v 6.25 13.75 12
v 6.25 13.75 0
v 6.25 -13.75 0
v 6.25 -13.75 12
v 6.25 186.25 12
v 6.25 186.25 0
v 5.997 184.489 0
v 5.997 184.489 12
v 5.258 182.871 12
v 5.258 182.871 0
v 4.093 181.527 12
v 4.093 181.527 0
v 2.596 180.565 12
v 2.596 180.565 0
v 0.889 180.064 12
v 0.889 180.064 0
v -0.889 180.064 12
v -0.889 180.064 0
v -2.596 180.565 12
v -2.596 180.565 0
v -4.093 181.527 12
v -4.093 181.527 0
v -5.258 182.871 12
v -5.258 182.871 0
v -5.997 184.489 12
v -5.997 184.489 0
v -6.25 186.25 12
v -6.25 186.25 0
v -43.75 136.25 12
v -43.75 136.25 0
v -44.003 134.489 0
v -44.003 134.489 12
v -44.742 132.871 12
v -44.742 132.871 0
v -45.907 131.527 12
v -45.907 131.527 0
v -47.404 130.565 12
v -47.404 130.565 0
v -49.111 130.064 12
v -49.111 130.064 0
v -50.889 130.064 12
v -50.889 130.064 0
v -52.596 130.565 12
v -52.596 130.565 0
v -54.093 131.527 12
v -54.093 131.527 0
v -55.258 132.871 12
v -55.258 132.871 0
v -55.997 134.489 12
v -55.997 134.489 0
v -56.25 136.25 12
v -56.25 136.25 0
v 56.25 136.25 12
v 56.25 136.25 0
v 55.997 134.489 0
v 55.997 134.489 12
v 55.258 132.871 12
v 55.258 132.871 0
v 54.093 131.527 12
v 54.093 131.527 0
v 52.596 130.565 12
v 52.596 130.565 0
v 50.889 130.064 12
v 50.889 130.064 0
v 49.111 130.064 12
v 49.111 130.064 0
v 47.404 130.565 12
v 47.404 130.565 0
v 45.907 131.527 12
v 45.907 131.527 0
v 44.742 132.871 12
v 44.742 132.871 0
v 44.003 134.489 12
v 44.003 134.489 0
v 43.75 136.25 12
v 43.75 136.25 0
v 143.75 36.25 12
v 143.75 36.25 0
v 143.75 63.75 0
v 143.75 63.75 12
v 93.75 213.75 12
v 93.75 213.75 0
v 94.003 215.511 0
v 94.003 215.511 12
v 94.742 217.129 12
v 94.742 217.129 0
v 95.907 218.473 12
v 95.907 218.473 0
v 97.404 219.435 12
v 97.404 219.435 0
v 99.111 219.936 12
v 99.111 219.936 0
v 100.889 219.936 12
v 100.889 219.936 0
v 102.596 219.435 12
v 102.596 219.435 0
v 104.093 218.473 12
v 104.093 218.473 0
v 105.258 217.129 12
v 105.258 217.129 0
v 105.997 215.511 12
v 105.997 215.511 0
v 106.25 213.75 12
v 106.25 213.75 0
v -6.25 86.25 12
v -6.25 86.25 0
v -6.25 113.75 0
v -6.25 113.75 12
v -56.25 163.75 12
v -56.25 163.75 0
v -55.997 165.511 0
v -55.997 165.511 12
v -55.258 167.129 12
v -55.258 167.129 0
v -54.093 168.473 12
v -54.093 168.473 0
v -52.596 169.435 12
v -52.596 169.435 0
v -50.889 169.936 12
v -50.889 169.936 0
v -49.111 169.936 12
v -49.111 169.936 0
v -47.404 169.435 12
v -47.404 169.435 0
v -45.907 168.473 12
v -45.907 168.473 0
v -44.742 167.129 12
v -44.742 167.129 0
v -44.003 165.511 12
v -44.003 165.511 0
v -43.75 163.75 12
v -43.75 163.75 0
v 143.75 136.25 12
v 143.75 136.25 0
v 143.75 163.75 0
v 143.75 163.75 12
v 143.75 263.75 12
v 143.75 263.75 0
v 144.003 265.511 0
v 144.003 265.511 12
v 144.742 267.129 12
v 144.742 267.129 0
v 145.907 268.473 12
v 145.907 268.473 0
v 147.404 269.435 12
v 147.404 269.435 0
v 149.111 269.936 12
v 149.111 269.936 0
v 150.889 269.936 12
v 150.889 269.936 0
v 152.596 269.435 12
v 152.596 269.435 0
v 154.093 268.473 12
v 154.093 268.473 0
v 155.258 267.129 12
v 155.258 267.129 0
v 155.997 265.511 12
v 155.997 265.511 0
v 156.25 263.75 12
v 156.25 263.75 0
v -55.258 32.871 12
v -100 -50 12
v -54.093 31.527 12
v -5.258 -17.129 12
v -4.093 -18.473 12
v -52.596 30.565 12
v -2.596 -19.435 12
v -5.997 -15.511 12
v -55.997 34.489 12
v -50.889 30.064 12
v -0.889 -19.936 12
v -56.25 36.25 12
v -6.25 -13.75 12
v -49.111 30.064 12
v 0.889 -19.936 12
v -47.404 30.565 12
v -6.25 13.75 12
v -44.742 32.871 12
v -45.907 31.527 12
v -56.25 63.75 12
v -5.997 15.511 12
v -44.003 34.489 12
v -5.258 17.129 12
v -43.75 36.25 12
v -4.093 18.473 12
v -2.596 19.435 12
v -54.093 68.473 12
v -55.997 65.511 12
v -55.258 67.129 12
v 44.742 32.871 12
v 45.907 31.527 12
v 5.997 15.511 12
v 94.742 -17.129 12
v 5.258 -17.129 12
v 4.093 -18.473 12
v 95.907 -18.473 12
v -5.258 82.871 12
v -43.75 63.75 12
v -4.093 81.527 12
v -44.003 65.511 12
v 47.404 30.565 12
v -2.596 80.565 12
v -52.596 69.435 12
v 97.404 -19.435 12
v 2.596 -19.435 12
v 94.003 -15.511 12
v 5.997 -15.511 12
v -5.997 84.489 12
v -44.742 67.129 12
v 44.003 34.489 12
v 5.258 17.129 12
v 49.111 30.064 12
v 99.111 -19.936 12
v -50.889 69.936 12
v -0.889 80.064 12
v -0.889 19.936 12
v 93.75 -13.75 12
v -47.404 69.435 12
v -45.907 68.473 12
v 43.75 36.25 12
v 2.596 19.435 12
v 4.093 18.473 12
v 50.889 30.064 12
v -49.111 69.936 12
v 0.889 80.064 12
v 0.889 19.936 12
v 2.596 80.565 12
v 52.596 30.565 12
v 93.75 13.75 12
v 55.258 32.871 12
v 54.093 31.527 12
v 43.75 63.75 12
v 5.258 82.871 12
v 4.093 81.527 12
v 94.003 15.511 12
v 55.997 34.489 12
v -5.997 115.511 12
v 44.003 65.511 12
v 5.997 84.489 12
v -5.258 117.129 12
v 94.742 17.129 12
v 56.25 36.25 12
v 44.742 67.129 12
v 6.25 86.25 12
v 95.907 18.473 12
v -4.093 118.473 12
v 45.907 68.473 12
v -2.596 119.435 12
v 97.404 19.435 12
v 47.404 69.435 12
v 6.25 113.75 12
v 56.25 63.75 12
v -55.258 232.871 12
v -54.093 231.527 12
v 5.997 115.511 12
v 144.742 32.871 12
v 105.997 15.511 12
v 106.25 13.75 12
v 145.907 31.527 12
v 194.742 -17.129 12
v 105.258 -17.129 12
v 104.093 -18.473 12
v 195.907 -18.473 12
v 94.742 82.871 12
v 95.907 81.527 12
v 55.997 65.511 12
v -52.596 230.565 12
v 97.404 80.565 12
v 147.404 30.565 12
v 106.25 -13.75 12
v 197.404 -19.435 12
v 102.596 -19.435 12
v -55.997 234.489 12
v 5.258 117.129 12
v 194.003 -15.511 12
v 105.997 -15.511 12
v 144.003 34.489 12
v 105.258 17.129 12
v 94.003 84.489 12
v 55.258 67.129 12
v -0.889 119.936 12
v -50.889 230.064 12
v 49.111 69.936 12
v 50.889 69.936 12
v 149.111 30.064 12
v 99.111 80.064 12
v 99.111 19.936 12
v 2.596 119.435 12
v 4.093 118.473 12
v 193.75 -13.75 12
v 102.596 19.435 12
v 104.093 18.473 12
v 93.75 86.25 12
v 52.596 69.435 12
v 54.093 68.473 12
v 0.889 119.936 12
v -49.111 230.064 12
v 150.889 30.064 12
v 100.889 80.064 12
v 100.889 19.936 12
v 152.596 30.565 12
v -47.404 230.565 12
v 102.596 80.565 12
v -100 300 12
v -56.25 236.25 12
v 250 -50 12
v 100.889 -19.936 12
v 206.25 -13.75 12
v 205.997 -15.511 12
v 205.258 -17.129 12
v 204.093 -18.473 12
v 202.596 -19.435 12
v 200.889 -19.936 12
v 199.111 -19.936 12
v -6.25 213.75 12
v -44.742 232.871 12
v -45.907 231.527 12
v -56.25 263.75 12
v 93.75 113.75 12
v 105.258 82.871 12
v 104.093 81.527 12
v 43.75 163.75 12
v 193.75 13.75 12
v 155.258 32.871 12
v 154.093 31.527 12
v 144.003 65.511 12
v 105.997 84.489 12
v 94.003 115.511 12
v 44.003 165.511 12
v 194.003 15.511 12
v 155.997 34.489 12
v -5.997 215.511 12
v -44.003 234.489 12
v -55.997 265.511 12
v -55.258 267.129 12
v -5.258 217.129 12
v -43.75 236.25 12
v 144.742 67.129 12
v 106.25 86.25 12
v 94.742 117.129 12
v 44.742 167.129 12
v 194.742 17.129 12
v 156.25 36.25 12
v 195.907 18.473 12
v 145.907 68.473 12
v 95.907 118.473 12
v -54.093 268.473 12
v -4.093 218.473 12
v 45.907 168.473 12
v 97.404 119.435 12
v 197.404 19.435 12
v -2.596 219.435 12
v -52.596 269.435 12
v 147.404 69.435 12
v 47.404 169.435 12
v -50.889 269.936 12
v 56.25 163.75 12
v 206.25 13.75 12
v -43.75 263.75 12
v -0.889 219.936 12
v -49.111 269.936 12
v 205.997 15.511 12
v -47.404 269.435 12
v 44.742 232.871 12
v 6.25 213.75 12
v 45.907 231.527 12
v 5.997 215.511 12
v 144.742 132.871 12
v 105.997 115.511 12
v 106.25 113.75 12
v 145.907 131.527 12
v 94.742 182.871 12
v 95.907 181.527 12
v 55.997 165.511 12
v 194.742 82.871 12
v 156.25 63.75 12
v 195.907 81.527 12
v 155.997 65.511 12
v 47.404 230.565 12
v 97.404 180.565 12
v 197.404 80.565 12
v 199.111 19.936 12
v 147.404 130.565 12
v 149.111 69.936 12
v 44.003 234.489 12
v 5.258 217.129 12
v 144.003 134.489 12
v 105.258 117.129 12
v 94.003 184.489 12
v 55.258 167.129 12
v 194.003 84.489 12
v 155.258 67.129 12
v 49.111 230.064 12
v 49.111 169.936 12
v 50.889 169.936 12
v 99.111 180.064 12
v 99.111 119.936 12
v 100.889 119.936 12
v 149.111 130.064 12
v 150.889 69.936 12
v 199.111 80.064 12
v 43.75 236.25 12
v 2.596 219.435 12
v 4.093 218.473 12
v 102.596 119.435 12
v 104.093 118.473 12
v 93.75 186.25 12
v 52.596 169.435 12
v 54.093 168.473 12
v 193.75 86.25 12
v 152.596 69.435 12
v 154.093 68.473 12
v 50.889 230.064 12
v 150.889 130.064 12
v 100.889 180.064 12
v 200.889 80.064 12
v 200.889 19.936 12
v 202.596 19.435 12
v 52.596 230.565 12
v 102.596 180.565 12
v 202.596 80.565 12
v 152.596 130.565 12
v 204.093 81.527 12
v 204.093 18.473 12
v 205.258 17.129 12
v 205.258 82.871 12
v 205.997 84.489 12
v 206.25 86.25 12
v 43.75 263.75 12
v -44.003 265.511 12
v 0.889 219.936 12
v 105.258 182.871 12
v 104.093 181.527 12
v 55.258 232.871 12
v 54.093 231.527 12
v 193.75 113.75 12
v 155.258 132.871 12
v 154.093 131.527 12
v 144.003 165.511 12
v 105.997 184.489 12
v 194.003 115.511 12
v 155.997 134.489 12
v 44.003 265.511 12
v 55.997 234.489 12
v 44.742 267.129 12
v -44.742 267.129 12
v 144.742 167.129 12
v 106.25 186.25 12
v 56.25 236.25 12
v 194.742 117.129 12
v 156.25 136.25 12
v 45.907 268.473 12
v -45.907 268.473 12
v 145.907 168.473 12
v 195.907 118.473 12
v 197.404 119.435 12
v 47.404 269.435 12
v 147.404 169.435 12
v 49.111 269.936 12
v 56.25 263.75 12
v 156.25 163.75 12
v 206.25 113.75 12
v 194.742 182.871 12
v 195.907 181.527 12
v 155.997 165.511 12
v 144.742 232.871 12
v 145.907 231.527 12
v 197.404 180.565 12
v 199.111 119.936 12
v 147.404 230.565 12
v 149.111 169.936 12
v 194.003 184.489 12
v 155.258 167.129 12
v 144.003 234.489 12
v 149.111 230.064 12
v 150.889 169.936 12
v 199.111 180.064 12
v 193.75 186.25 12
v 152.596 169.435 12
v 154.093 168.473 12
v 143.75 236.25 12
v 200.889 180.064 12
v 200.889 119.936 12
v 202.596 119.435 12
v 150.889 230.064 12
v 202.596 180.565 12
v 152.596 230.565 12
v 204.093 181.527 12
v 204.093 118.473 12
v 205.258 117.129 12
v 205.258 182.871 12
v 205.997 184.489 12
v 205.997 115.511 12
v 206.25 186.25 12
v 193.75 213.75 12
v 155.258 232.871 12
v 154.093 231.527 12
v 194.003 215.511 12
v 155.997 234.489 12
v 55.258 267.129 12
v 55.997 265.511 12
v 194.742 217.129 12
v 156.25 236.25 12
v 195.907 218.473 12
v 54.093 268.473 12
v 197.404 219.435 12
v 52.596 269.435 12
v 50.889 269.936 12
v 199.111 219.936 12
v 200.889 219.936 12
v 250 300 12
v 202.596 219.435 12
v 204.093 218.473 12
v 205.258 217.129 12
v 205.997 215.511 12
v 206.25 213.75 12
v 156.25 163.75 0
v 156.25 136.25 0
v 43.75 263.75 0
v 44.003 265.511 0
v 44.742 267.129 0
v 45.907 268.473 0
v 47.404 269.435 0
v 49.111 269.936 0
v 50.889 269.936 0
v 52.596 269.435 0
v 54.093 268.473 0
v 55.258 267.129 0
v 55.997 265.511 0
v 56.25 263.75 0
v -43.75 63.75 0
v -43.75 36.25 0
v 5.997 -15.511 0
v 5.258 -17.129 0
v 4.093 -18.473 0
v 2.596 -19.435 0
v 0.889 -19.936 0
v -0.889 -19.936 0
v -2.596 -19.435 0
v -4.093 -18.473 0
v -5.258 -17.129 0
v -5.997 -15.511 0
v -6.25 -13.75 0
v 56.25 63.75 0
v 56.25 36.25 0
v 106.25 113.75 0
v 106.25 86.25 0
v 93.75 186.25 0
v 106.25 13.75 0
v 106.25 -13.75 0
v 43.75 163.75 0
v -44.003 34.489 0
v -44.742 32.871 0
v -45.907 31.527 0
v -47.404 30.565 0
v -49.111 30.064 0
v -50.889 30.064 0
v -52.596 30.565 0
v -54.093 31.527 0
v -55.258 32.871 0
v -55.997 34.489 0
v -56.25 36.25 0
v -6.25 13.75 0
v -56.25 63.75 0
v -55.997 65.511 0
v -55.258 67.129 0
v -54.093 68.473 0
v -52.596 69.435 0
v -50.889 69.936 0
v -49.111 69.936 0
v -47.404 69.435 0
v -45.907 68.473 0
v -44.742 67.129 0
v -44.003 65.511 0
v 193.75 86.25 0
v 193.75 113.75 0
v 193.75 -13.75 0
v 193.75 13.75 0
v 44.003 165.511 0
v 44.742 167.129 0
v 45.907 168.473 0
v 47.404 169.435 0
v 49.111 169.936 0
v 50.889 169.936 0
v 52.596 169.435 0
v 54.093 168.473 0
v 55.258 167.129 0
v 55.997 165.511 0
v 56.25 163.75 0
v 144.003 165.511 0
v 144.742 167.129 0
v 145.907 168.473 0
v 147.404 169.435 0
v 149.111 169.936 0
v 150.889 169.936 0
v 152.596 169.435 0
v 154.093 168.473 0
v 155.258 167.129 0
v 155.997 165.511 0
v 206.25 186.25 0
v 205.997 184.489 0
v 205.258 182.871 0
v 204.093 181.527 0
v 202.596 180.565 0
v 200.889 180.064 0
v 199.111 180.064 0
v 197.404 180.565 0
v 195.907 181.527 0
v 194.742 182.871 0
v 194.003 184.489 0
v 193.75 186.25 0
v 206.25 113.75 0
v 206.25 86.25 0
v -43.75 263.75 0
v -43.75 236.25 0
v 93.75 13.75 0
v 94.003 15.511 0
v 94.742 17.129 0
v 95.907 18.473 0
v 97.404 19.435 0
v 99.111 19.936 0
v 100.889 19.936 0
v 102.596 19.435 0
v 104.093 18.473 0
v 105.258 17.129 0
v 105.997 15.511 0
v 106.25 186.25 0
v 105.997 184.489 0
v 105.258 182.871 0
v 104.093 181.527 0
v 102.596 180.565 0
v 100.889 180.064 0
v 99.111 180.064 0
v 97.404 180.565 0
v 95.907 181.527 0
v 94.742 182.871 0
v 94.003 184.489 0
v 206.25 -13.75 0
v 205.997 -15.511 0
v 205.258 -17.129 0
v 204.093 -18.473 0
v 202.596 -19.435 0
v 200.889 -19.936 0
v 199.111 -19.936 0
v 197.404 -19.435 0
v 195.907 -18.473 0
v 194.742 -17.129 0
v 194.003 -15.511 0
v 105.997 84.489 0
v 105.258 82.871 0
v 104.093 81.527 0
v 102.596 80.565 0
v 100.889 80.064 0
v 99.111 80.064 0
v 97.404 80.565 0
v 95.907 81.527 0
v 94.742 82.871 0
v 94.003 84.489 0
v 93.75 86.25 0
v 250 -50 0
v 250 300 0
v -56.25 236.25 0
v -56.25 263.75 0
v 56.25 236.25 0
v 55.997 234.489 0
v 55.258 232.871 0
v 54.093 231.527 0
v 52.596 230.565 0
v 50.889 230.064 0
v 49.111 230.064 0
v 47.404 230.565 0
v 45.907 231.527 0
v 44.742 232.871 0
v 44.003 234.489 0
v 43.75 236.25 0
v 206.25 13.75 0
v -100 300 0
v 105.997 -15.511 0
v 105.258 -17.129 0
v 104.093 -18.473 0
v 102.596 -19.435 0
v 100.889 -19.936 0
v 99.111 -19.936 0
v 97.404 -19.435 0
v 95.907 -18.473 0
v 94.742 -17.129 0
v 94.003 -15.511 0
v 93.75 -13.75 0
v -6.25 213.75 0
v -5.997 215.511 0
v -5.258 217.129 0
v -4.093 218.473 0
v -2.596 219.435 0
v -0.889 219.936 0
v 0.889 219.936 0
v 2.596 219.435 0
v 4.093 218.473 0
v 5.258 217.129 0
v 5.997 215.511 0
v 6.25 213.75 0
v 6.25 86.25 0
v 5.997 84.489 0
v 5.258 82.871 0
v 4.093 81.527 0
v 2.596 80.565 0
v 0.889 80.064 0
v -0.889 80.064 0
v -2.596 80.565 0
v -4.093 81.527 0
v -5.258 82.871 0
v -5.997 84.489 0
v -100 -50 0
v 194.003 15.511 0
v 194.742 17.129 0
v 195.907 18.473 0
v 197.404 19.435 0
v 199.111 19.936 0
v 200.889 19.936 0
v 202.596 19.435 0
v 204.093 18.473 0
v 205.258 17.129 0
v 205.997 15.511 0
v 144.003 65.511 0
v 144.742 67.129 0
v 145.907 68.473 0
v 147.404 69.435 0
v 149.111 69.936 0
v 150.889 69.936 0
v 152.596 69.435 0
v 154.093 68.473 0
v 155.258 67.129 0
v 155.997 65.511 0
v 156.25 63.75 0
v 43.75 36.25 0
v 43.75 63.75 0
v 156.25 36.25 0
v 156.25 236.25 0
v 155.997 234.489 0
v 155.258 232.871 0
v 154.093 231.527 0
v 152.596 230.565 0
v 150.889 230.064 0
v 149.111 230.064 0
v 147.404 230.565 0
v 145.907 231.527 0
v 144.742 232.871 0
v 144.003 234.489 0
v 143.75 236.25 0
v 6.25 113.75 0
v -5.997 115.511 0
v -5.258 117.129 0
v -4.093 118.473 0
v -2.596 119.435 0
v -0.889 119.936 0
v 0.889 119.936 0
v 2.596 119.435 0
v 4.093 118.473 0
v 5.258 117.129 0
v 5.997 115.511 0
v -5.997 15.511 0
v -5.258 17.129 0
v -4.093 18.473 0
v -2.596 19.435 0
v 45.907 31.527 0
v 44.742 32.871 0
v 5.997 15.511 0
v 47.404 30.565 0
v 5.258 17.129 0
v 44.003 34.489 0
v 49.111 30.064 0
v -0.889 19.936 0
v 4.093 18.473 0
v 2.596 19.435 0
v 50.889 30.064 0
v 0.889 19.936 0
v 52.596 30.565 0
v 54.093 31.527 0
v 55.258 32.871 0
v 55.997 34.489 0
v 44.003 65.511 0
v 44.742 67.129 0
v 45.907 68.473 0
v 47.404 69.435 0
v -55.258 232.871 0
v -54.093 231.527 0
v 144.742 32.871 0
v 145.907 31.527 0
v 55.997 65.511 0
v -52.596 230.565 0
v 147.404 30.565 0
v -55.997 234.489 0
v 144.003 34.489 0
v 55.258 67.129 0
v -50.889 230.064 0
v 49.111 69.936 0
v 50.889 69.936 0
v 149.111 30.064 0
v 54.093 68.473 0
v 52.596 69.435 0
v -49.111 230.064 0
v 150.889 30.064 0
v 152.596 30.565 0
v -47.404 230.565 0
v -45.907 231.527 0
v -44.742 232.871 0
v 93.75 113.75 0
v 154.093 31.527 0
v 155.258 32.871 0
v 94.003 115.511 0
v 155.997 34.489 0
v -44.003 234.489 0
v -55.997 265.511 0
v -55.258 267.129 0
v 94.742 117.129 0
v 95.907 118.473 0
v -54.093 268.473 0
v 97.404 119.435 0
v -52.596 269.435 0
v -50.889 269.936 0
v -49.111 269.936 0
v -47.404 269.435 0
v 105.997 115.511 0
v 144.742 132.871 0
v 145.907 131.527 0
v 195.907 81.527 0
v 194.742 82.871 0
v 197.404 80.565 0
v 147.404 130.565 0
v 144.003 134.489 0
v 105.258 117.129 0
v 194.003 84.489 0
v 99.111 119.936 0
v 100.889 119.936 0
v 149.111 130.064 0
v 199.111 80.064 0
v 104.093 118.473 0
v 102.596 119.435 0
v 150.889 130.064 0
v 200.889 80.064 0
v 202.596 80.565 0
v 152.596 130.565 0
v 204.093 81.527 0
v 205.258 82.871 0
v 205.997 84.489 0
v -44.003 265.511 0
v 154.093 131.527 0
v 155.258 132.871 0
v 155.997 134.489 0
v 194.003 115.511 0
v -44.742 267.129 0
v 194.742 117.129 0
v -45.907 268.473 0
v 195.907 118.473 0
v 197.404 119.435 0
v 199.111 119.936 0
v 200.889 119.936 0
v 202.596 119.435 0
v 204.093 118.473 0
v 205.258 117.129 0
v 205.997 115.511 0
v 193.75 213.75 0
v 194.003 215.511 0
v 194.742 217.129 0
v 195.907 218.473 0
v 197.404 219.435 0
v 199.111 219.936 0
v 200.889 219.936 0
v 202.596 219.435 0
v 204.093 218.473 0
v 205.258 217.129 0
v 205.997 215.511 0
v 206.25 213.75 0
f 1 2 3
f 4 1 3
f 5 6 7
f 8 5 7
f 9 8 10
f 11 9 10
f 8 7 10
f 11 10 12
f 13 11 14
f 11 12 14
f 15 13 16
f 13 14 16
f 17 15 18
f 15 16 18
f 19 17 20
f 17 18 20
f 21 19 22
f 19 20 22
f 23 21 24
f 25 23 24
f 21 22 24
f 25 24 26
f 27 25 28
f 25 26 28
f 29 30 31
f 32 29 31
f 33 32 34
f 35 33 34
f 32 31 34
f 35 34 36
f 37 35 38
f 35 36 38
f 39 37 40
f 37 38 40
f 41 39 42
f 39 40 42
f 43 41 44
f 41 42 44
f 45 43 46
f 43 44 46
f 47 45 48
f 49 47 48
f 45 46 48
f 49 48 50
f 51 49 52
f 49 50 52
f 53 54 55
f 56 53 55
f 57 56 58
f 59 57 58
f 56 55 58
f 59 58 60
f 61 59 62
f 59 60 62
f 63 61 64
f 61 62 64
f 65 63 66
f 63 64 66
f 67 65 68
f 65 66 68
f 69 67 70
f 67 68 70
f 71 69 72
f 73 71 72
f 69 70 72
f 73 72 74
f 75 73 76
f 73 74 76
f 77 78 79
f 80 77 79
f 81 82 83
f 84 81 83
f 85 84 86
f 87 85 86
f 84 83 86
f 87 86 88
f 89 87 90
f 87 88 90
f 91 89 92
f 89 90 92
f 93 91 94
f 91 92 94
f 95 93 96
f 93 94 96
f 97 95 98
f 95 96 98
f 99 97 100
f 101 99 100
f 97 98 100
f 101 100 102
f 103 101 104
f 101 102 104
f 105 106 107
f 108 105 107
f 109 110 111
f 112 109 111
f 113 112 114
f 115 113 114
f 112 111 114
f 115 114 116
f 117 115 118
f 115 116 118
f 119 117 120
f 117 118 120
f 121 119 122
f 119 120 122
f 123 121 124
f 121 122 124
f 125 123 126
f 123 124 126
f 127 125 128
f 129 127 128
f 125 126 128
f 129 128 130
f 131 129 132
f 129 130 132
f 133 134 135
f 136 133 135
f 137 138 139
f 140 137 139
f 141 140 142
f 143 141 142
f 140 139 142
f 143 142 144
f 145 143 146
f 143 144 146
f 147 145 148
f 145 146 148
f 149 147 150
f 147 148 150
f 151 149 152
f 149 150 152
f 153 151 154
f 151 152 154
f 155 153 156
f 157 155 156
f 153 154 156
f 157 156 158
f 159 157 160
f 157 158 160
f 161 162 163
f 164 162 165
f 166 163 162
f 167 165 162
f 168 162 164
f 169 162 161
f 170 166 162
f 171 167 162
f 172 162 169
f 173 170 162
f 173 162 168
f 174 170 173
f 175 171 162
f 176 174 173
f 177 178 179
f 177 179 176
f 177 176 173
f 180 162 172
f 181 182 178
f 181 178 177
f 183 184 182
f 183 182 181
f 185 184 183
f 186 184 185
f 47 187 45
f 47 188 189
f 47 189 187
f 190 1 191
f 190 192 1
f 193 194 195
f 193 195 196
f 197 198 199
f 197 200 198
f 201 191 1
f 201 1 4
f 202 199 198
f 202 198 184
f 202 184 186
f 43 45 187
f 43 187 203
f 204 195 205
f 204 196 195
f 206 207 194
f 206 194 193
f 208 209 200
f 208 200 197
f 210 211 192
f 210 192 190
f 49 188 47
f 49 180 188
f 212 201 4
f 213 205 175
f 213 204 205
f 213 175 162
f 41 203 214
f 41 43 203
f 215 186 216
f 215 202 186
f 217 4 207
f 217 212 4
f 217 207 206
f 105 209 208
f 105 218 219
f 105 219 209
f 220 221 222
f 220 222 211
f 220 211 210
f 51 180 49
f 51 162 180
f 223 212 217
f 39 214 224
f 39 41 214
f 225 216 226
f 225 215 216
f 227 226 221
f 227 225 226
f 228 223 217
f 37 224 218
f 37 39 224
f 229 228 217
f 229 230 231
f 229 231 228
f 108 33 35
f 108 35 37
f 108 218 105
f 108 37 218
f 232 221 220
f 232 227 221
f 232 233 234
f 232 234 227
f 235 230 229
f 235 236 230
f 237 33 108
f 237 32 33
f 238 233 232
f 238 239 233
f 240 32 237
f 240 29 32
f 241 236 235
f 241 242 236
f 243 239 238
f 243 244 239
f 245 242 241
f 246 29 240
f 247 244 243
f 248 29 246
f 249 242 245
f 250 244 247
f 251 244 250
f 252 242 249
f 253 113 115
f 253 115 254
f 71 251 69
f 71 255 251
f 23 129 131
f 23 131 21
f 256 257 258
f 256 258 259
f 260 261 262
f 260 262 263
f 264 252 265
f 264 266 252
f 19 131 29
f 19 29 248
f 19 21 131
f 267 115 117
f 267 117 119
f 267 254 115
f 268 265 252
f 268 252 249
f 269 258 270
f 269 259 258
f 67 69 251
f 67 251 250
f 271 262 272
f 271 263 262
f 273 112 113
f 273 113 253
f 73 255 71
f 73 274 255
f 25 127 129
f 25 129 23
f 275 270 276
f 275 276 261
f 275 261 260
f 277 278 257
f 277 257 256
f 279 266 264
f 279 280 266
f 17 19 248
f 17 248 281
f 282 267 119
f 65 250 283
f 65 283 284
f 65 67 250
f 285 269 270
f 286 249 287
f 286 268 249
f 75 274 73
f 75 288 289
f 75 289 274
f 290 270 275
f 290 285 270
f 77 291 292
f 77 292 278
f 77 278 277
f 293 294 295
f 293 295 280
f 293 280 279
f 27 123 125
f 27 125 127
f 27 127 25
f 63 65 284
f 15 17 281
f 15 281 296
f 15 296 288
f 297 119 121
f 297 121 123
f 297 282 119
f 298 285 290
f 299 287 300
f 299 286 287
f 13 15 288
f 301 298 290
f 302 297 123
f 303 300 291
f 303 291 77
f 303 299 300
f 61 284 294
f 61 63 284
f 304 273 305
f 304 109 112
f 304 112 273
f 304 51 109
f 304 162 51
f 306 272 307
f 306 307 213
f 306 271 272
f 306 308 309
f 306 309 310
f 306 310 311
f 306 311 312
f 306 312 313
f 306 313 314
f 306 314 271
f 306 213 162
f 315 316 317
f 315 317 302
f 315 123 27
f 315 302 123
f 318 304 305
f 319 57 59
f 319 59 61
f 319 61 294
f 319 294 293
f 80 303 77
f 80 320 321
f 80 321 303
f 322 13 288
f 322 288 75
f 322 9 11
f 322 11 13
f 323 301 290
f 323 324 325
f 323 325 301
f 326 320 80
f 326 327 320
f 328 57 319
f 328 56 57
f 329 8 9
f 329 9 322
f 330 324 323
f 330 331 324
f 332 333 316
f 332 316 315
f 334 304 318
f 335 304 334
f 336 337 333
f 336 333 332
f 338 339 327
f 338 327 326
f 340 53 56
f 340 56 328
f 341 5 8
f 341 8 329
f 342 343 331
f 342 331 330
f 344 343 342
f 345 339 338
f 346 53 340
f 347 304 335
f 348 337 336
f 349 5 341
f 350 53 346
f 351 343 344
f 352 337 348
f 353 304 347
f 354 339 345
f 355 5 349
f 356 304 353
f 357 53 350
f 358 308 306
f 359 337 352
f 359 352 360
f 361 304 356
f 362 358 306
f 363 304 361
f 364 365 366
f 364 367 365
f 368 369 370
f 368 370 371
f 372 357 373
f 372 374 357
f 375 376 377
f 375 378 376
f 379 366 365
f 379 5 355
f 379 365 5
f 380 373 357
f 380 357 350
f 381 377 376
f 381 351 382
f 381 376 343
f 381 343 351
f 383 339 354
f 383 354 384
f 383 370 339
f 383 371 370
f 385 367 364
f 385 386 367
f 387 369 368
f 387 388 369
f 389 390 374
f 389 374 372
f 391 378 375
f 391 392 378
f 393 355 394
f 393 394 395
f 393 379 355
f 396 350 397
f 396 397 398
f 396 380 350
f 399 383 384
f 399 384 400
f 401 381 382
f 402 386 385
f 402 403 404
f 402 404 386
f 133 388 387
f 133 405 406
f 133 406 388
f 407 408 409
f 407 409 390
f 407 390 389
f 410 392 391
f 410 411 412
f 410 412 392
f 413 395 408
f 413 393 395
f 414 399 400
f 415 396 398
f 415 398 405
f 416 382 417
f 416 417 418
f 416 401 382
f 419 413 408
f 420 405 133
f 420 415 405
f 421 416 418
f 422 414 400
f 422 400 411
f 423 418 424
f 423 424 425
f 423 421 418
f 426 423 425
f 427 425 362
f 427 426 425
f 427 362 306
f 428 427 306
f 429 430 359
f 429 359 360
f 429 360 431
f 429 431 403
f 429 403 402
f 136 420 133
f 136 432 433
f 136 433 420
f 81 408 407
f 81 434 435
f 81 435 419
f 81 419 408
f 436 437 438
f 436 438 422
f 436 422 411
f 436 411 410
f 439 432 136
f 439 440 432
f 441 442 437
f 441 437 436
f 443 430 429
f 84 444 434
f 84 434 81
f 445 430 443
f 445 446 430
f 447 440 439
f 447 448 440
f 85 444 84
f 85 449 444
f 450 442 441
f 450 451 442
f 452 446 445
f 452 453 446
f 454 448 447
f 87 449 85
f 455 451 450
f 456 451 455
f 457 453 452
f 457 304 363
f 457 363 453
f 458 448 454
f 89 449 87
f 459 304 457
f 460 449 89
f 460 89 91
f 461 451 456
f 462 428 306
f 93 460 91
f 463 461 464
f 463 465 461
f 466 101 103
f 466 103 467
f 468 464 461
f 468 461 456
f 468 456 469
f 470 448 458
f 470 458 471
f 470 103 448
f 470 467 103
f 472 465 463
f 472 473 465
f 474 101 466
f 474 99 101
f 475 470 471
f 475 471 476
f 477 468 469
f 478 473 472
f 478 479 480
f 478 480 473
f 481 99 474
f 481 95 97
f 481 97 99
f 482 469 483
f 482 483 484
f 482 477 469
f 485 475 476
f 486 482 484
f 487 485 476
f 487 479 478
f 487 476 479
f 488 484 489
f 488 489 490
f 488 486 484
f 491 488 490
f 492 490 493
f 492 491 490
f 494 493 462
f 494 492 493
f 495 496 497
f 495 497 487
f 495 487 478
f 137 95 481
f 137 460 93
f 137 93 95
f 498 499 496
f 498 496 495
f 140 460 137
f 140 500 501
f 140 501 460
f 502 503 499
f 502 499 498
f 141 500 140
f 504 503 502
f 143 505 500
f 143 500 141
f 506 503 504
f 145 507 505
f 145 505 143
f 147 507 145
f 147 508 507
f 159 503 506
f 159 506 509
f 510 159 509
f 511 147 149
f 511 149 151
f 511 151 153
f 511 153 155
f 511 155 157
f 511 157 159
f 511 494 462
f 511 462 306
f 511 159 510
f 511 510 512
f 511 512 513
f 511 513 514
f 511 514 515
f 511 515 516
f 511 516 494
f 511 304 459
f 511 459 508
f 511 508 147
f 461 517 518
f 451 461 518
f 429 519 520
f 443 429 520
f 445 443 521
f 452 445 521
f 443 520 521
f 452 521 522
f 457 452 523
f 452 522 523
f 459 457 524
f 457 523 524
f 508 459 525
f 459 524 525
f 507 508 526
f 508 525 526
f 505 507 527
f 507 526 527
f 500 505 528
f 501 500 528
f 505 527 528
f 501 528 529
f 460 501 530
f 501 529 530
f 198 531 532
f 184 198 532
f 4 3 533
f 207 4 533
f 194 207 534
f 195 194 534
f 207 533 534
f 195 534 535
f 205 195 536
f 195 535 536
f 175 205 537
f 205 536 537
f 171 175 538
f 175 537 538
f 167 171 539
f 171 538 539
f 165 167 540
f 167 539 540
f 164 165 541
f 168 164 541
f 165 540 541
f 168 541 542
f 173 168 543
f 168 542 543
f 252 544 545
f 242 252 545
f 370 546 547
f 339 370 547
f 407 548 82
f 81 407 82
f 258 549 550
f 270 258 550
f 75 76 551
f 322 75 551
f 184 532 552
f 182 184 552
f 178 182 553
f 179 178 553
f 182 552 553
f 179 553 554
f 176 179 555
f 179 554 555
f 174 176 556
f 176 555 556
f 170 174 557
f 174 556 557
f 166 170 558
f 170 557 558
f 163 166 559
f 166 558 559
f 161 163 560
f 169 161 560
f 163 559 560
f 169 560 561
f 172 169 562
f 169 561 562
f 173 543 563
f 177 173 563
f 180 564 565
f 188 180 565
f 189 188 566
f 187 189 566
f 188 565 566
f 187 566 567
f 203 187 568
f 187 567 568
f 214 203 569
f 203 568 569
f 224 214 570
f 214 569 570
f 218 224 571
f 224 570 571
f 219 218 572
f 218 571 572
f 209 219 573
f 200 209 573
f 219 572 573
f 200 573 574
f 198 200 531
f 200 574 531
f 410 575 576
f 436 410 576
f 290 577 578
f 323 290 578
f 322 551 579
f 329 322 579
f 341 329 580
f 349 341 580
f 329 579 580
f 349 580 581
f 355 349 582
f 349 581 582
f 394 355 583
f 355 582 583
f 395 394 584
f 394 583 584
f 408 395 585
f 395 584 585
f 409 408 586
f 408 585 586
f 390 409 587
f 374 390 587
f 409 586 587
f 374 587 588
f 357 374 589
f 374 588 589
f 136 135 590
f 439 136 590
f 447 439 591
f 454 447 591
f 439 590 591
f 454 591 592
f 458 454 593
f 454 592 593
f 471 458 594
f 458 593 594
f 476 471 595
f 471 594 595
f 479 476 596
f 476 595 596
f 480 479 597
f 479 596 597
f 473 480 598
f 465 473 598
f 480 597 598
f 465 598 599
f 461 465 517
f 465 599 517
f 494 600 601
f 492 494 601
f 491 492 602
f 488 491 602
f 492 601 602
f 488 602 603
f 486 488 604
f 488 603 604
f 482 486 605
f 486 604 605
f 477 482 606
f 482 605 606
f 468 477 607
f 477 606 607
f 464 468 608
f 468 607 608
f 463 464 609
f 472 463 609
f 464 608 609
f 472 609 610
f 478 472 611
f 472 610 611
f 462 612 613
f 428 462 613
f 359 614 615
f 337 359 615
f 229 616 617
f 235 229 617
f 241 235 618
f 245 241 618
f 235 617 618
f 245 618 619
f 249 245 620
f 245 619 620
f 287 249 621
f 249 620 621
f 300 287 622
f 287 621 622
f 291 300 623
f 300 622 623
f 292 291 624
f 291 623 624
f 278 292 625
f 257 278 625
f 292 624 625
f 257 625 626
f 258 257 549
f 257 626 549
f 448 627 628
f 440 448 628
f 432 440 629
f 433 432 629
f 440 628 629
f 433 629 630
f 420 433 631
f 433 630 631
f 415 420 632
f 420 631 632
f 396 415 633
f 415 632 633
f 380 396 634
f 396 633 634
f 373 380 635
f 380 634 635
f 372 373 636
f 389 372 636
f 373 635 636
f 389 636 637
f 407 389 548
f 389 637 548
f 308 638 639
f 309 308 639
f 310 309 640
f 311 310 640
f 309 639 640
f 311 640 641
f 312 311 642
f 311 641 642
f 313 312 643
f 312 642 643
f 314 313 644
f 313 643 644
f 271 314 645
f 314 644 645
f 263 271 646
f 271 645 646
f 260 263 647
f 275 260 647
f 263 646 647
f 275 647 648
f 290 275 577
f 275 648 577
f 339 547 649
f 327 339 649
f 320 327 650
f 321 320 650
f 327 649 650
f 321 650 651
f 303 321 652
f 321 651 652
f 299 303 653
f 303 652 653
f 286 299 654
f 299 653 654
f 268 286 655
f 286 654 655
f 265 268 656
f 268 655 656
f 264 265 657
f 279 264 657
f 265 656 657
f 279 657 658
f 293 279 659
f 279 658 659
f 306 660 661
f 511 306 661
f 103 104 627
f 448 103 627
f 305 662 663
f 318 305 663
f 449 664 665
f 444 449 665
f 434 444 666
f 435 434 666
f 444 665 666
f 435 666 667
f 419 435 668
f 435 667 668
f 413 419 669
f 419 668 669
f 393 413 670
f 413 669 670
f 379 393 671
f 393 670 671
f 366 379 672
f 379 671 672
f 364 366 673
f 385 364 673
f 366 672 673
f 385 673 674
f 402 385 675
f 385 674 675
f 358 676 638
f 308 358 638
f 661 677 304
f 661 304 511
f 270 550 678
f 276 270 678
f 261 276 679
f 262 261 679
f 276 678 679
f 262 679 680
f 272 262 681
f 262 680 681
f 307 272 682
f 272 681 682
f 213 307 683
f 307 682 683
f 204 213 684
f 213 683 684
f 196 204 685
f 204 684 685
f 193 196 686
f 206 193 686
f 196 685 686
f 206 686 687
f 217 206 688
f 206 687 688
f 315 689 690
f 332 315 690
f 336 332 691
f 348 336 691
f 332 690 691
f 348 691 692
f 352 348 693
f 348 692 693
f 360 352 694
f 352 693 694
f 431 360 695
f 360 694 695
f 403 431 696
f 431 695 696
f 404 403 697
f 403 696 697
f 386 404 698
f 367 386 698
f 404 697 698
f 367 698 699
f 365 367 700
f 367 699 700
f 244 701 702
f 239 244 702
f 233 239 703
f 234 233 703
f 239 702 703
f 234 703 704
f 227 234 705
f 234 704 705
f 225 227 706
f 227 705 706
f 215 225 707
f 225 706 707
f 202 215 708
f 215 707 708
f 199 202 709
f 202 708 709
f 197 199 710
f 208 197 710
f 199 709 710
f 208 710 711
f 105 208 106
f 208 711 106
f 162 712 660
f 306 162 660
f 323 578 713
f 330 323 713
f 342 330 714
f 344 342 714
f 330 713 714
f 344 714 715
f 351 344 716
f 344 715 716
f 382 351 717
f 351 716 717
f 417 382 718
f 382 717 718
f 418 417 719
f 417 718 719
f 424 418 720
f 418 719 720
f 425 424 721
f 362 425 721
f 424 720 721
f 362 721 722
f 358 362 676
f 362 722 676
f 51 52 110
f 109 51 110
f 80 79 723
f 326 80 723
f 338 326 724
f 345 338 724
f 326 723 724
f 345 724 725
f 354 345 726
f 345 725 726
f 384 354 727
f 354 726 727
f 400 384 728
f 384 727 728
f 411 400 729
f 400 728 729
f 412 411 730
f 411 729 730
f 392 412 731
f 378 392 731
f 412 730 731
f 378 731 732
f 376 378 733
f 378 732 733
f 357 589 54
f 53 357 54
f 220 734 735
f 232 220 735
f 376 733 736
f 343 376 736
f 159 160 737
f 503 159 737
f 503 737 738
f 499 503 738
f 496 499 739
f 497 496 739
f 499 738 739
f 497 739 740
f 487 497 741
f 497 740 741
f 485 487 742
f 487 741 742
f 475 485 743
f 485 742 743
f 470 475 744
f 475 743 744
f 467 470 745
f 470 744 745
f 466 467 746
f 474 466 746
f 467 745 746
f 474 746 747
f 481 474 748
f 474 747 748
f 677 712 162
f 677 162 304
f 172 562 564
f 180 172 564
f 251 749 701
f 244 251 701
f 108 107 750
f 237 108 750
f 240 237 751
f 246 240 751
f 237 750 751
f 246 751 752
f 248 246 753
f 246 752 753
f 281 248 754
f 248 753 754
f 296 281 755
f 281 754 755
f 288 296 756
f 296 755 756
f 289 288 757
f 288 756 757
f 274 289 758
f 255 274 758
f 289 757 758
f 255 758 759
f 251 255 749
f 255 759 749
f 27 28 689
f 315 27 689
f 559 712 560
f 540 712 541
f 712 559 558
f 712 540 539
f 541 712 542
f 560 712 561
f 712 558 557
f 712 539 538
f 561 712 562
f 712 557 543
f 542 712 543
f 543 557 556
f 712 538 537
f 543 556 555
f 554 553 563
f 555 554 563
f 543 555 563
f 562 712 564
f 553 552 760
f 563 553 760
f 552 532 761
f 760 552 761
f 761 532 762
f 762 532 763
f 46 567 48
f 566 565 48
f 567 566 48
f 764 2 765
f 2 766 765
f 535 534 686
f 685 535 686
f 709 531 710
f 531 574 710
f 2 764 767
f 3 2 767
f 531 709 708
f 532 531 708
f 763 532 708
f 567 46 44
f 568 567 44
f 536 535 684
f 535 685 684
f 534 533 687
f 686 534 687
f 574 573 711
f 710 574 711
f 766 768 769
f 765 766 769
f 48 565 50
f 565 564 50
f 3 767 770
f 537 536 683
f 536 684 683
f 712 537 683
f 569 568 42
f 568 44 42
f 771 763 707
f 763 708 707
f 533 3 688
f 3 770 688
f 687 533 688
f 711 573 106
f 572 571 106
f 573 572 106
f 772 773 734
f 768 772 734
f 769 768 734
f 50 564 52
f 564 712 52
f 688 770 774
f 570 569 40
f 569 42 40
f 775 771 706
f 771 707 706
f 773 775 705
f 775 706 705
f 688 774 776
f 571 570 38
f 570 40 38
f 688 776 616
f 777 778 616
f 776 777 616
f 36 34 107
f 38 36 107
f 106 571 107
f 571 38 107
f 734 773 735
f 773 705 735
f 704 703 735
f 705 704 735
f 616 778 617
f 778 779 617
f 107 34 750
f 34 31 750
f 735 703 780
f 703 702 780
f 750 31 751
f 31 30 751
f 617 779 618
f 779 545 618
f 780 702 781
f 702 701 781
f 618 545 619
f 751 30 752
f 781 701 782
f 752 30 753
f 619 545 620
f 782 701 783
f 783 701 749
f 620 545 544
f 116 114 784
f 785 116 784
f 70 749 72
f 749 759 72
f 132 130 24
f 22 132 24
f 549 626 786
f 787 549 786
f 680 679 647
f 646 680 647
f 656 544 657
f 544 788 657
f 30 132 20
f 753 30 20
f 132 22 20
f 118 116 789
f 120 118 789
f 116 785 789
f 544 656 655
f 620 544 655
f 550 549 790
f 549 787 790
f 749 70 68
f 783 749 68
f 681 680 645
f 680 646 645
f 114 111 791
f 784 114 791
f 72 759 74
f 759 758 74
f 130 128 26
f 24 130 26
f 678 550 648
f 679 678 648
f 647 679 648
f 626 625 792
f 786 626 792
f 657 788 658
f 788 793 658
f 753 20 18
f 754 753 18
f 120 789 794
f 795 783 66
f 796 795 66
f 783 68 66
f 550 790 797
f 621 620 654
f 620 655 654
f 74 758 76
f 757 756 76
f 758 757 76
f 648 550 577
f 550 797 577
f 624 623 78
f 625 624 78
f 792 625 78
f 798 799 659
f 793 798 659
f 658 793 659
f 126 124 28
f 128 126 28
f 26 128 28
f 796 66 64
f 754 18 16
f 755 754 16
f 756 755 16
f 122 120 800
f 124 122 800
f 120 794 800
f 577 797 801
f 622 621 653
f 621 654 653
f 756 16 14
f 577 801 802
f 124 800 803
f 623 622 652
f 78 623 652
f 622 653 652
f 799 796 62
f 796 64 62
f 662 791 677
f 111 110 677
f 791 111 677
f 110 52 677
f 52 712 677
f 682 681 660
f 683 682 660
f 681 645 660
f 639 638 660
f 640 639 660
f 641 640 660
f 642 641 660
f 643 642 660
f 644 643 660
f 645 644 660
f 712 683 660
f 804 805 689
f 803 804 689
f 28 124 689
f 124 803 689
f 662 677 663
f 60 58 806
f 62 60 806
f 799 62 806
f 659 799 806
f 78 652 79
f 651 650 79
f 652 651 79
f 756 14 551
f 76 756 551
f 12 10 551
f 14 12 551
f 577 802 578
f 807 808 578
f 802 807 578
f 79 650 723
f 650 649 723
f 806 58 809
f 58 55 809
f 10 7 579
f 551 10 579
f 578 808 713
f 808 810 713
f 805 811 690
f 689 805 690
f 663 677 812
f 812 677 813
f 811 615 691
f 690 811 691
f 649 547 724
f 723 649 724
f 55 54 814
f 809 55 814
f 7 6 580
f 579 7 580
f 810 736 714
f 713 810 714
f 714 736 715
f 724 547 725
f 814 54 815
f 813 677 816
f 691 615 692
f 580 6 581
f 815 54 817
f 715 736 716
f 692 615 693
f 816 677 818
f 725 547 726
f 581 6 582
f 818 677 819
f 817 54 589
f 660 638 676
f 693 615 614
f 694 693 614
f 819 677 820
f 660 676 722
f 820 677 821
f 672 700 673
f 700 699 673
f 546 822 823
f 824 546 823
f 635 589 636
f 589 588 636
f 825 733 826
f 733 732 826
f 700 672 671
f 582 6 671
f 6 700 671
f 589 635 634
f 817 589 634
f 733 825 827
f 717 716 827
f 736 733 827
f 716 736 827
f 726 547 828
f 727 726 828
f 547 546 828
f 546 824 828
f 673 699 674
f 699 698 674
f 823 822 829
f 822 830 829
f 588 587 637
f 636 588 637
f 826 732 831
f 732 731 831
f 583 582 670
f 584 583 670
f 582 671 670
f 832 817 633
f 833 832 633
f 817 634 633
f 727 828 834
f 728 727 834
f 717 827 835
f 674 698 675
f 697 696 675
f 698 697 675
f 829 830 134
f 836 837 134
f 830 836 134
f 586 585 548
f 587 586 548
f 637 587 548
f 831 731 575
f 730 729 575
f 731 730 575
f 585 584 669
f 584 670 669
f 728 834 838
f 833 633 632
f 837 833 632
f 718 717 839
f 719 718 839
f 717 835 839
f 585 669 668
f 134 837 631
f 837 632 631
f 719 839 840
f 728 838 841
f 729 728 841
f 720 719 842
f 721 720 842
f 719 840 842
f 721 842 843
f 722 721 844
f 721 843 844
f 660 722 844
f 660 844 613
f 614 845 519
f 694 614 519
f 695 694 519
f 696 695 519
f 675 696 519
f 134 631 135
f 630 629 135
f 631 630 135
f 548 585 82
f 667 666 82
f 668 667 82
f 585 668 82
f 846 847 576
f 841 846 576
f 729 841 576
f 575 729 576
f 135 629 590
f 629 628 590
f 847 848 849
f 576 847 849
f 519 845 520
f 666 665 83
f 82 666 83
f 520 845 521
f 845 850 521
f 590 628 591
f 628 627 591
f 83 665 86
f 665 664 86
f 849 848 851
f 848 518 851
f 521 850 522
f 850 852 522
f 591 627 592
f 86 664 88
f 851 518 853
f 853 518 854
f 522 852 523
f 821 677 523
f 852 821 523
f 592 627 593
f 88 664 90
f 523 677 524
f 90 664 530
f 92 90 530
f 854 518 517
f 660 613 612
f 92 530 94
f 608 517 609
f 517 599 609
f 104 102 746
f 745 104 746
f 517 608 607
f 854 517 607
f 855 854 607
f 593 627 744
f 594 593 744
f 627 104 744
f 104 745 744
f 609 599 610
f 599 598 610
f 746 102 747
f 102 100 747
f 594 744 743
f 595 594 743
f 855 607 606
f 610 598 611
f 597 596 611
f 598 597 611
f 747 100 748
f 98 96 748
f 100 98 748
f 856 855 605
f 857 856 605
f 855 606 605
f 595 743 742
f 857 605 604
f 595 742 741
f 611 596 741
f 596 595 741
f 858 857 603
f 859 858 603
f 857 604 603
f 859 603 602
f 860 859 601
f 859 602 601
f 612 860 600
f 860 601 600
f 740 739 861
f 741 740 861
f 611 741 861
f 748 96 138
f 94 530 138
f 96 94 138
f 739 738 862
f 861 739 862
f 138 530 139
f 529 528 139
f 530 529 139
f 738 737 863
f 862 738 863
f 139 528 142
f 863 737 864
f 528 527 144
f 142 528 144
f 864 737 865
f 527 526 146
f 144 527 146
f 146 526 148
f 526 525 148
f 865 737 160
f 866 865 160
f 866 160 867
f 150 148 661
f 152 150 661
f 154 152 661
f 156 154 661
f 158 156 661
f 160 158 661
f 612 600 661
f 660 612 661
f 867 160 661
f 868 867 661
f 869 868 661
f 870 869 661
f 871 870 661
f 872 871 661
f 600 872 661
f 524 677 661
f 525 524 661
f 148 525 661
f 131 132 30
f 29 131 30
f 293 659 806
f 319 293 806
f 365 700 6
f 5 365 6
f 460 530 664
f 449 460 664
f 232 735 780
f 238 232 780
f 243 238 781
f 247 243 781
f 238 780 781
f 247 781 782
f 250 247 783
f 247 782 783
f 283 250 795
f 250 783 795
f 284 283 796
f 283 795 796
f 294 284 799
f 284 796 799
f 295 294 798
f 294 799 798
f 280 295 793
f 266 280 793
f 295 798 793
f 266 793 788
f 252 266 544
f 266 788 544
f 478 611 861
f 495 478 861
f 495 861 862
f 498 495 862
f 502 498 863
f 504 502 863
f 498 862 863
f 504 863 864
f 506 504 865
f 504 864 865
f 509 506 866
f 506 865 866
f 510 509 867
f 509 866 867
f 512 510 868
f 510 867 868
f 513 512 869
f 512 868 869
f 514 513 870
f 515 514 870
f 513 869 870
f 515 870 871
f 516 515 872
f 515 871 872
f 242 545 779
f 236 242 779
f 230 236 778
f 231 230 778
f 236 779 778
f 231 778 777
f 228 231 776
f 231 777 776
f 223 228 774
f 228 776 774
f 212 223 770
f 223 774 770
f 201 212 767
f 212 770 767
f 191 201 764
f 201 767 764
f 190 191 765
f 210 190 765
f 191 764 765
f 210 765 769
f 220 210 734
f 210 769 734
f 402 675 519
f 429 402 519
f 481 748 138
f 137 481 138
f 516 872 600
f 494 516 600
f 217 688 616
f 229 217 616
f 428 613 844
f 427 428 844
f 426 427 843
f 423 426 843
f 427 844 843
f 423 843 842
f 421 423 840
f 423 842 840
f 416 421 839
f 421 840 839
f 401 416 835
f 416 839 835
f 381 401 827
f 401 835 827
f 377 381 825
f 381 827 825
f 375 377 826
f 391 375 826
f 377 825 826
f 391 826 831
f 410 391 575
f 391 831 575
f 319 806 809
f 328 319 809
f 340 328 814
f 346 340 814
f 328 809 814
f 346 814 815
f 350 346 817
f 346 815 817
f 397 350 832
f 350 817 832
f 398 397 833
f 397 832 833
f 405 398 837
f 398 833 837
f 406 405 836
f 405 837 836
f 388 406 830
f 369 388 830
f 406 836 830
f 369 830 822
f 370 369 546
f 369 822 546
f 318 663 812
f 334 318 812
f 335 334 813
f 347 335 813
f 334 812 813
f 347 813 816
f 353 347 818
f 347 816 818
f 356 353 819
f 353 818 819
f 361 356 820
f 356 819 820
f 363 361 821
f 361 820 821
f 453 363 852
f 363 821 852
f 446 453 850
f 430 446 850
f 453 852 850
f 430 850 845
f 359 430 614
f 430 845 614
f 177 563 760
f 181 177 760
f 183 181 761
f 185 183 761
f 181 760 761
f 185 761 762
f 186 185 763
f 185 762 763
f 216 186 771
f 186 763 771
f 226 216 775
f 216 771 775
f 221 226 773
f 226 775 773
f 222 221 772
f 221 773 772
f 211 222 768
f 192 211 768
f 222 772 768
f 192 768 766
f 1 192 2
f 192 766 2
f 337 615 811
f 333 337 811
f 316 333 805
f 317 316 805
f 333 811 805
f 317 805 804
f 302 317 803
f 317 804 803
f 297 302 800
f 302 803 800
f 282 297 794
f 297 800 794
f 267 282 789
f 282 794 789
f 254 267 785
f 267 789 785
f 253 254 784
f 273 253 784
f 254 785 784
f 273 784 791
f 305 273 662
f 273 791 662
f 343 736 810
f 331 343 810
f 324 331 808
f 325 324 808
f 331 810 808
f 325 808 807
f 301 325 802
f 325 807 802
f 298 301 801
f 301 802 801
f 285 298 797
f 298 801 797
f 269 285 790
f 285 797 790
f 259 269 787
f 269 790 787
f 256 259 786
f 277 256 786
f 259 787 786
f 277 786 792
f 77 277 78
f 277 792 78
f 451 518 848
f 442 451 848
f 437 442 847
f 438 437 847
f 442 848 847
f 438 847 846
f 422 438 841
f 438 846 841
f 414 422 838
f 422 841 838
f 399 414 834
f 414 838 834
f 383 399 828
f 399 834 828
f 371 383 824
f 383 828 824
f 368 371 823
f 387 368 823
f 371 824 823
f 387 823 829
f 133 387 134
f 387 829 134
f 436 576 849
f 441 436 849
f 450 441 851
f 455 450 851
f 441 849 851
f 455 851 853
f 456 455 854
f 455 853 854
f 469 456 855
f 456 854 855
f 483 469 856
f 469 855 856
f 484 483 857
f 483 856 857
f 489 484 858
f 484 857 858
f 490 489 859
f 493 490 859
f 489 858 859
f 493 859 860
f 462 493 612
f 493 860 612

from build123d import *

# Parameters (mm, degrees)
SKETCH_1_W      = 350
SKETCH_1_H      = 350
EXTRUDE_1_DEPTH = 12


with BuildPart() as part:
    # Эскиз1 → Бобышка-Вытянуть1 (new body)
    with BuildSketch(Plane.XY):
        with Locations((75, 125)):
            Rectangle(SKETCH_1_W, SKETCH_1_H)
        with BuildLine():
            Line((6.25, 13.75), (6.25, -13.75))
            ThreePointArc((6.25, -13.75), (0, -20), (-6.25, -13.75))
            Line((-6.25, -13.75), (-6.25, 13.75))
            ThreePointArc((-6.25, 13.75), (0, 20), (6.25, 13.75))
        make_face(mode=Mode.SUBTRACT)
        with BuildLine():
            Line((-43.75, 63.75), (-43.75, 36.25))
            ThreePointArc((-43.75, 36.25), (-50, 30), (-56.25, 36.25))
            Line((-56.25, 36.25), (-56.25, 63.75))
            ThreePointArc((-56.25, 63.75), (-50, 70), (-43.75, 63.75))
        make_face(mode=Mode.SUBTRACT)
        with BuildLine():
            Line((106.25, 13.75), (106.25, -13.75))
            ThreePointArc((106.25, -13.75), (100, -20), (93.75, -13.75))
            Line((93.75, -13.75), (93.75, 13.75))
            ThreePointArc((93.75, 13.75), (100, 20), (106.25, 13.75))
        make_face(mode=Mode.SUBTRACT)
        with BuildLine():
            Line((56.25, 63.75), (56.25, 36.25))
            ThreePointArc((56.25, 36.25), (50, 30), (43.75, 36.25))
            Line((43.75, 36.25), (43.75, 63.75))
            ThreePointArc((43.75, 63.75), (50, 70), (56.25, 63.75))
        make_face(mode=Mode.SUBTRACT)
        with BuildLine():
            Line((206.25, 13.75), (206.25, -13.75))
            ThreePointArc((206.25, -13.75), (200, -20), (193.75, -13.75))
            Line((193.75, -13.75), (193.75, 13.75))
            ThreePointArc((193.75, 13.75), (200, 20), (206.25, 13.75))
        make_face(mode=Mode.SUBTRACT)
        with BuildLine():
            Line((156.25, 63.75), (156.25, 36.25))
            ThreePointArc((156.25, 36.25), (150, 30), (143.75, 36.25))
            Line((143.75, 36.25), (143.75, 63.75))
            ThreePointArc((143.75, 63.75), (150, 70), (156.25, 63.75))
        make_face(mode=Mode.SUBTRACT)
        with BuildLine():
            Line((106.25, 113.75), (106.25, 86.25))
            ThreePointArc((106.25, 86.25), (100, 80), (93.75, 86.25))
            Line((93.75, 86.25), (93.75, 113.75))
            ThreePointArc((93.75, 113.75), (100, 120), (106.25, 113.75))
        make_face(mode=Mode.SUBTRACT)
        with BuildLine():
            Line((56.25, 163.75), (56.25, 136.25))
            ThreePointArc((56.25, 136.25), (50, 130), (43.75, 136.25))
            Line((43.75, 136.25), (43.75, 163.75))
            ThreePointArc((43.75, 163.75), (50, 170), (56.25, 163.75))
        make_face(mode=Mode.SUBTRACT)
        with BuildLine():
            Line((206.25, 113.75), (206.25, 86.25))
            ThreePointArc((206.25, 86.25), (200, 80), (193.75, 86.25))
            Line((193.75, 86.25), (193.75, 113.75))
            ThreePointArc((193.75, 113.75), (200, 120), (206.25, 113.75))
        make_face(mode=Mode.SUBTRACT)
        with BuildLine():
            Line((156.25, 163.75), (156.25, 136.25))
            ThreePointArc((156.25, 136.25), (150, 130), (143.75, 136.25))
            Line((143.75, 136.25), (143.75, 163.75))
            ThreePointArc((143.75, 163.75), (150, 170), (156.25, 163.75))
        make_face(mode=Mode.SUBTRACT)
        with BuildLine():
            Line((106.25, 213.75), (106.25, 186.25))
            ThreePointArc((106.25, 186.25), (100, 180), (93.75, 186.25))
            Line((93.75, 186.25), (93.75, 213.75))
            ThreePointArc((93.75, 213.75), (100, 220), (106.25, 213.75))
        make_face(mode=Mode.SUBTRACT)
        with BuildLine():
            Line((56.25, 263.75), (56.25, 236.25))
            ThreePointArc((56.25, 236.25), (50, 230), (43.75, 236.25))
            Line((43.75, 236.25), (43.75, 263.75))
            ThreePointArc((43.75, 263.75), (50, 270), (56.25, 263.75))
        make_face(mode=Mode.SUBTRACT)
        with BuildLine():
            Line((206.25, 213.75), (206.25, 186.25))
            ThreePointArc((206.25, 186.25), (200, 180), (193.75, 186.25))
            Line((193.75, 186.25), (193.75, 213.75))
            ThreePointArc((193.75, 213.75), (200, 220), (206.25, 213.75))
        make_face(mode=Mode.SUBTRACT)
        with BuildLine():
            Line((156.25, 263.75), (156.25, 236.25))
            ThreePointArc((156.25, 236.25), (150, 230), (143.75, 236.25))
            Line((143.75, 236.25), (143.75, 263.75))
            ThreePointArc((143.75, 263.75), (150, 270), (156.25, 263.75))
        make_face(mode=Mode.SUBTRACT)
        with BuildLine():
            Line((6.25, 113.75), (6.25, 86.25))
            ThreePointArc((6.25, 86.25), (0, 80), (-6.25, 86.25))
            Line((-6.25, 86.25), (-6.25, 113.75))
            ThreePointArc((-6.25, 113.75), (0, 120), (6.25, 113.75))
        make_face(mode=Mode.SUBTRACT)
        with BuildLine():
            Line((-43.75, 163.75), (-43.75, 136.25))
            ThreePointArc((-43.75, 136.25), (-50, 130), (-56.25, 136.25))
            Line((-56.25, 136.25), (-56.25, 163.75))
            ThreePointArc((-56.25, 163.75), (-50, 170), (-43.75, 163.75))
        make_face(mode=Mode.SUBTRACT)
        with BuildLine():
            Line((6.25, 213.75), (6.25, 186.25))
            ThreePointArc((6.25, 186.25), (0, 180), (-6.25, 186.25))
            Line((-6.25, 186.25), (-6.25, 213.75))
            ThreePointArc((-6.25, 213.75), (0, 220), (6.25, 213.75))
        make_face(mode=Mode.SUBTRACT)
        with BuildLine():
            Line((-43.75, 263.75), (-43.75, 236.25))
            ThreePointArc((-43.75, 236.25), (-50, 230), (-56.25, 236.25))
            Line((-56.25, 236.25), (-56.25, 263.75))
            ThreePointArc((-56.25, 263.75), (-50, 270), (-43.75, 263.75))
        make_face(mode=Mode.SUBTRACT)
    extrude(amount=EXTRUDE_1_DEPTH)


solid = part.part
